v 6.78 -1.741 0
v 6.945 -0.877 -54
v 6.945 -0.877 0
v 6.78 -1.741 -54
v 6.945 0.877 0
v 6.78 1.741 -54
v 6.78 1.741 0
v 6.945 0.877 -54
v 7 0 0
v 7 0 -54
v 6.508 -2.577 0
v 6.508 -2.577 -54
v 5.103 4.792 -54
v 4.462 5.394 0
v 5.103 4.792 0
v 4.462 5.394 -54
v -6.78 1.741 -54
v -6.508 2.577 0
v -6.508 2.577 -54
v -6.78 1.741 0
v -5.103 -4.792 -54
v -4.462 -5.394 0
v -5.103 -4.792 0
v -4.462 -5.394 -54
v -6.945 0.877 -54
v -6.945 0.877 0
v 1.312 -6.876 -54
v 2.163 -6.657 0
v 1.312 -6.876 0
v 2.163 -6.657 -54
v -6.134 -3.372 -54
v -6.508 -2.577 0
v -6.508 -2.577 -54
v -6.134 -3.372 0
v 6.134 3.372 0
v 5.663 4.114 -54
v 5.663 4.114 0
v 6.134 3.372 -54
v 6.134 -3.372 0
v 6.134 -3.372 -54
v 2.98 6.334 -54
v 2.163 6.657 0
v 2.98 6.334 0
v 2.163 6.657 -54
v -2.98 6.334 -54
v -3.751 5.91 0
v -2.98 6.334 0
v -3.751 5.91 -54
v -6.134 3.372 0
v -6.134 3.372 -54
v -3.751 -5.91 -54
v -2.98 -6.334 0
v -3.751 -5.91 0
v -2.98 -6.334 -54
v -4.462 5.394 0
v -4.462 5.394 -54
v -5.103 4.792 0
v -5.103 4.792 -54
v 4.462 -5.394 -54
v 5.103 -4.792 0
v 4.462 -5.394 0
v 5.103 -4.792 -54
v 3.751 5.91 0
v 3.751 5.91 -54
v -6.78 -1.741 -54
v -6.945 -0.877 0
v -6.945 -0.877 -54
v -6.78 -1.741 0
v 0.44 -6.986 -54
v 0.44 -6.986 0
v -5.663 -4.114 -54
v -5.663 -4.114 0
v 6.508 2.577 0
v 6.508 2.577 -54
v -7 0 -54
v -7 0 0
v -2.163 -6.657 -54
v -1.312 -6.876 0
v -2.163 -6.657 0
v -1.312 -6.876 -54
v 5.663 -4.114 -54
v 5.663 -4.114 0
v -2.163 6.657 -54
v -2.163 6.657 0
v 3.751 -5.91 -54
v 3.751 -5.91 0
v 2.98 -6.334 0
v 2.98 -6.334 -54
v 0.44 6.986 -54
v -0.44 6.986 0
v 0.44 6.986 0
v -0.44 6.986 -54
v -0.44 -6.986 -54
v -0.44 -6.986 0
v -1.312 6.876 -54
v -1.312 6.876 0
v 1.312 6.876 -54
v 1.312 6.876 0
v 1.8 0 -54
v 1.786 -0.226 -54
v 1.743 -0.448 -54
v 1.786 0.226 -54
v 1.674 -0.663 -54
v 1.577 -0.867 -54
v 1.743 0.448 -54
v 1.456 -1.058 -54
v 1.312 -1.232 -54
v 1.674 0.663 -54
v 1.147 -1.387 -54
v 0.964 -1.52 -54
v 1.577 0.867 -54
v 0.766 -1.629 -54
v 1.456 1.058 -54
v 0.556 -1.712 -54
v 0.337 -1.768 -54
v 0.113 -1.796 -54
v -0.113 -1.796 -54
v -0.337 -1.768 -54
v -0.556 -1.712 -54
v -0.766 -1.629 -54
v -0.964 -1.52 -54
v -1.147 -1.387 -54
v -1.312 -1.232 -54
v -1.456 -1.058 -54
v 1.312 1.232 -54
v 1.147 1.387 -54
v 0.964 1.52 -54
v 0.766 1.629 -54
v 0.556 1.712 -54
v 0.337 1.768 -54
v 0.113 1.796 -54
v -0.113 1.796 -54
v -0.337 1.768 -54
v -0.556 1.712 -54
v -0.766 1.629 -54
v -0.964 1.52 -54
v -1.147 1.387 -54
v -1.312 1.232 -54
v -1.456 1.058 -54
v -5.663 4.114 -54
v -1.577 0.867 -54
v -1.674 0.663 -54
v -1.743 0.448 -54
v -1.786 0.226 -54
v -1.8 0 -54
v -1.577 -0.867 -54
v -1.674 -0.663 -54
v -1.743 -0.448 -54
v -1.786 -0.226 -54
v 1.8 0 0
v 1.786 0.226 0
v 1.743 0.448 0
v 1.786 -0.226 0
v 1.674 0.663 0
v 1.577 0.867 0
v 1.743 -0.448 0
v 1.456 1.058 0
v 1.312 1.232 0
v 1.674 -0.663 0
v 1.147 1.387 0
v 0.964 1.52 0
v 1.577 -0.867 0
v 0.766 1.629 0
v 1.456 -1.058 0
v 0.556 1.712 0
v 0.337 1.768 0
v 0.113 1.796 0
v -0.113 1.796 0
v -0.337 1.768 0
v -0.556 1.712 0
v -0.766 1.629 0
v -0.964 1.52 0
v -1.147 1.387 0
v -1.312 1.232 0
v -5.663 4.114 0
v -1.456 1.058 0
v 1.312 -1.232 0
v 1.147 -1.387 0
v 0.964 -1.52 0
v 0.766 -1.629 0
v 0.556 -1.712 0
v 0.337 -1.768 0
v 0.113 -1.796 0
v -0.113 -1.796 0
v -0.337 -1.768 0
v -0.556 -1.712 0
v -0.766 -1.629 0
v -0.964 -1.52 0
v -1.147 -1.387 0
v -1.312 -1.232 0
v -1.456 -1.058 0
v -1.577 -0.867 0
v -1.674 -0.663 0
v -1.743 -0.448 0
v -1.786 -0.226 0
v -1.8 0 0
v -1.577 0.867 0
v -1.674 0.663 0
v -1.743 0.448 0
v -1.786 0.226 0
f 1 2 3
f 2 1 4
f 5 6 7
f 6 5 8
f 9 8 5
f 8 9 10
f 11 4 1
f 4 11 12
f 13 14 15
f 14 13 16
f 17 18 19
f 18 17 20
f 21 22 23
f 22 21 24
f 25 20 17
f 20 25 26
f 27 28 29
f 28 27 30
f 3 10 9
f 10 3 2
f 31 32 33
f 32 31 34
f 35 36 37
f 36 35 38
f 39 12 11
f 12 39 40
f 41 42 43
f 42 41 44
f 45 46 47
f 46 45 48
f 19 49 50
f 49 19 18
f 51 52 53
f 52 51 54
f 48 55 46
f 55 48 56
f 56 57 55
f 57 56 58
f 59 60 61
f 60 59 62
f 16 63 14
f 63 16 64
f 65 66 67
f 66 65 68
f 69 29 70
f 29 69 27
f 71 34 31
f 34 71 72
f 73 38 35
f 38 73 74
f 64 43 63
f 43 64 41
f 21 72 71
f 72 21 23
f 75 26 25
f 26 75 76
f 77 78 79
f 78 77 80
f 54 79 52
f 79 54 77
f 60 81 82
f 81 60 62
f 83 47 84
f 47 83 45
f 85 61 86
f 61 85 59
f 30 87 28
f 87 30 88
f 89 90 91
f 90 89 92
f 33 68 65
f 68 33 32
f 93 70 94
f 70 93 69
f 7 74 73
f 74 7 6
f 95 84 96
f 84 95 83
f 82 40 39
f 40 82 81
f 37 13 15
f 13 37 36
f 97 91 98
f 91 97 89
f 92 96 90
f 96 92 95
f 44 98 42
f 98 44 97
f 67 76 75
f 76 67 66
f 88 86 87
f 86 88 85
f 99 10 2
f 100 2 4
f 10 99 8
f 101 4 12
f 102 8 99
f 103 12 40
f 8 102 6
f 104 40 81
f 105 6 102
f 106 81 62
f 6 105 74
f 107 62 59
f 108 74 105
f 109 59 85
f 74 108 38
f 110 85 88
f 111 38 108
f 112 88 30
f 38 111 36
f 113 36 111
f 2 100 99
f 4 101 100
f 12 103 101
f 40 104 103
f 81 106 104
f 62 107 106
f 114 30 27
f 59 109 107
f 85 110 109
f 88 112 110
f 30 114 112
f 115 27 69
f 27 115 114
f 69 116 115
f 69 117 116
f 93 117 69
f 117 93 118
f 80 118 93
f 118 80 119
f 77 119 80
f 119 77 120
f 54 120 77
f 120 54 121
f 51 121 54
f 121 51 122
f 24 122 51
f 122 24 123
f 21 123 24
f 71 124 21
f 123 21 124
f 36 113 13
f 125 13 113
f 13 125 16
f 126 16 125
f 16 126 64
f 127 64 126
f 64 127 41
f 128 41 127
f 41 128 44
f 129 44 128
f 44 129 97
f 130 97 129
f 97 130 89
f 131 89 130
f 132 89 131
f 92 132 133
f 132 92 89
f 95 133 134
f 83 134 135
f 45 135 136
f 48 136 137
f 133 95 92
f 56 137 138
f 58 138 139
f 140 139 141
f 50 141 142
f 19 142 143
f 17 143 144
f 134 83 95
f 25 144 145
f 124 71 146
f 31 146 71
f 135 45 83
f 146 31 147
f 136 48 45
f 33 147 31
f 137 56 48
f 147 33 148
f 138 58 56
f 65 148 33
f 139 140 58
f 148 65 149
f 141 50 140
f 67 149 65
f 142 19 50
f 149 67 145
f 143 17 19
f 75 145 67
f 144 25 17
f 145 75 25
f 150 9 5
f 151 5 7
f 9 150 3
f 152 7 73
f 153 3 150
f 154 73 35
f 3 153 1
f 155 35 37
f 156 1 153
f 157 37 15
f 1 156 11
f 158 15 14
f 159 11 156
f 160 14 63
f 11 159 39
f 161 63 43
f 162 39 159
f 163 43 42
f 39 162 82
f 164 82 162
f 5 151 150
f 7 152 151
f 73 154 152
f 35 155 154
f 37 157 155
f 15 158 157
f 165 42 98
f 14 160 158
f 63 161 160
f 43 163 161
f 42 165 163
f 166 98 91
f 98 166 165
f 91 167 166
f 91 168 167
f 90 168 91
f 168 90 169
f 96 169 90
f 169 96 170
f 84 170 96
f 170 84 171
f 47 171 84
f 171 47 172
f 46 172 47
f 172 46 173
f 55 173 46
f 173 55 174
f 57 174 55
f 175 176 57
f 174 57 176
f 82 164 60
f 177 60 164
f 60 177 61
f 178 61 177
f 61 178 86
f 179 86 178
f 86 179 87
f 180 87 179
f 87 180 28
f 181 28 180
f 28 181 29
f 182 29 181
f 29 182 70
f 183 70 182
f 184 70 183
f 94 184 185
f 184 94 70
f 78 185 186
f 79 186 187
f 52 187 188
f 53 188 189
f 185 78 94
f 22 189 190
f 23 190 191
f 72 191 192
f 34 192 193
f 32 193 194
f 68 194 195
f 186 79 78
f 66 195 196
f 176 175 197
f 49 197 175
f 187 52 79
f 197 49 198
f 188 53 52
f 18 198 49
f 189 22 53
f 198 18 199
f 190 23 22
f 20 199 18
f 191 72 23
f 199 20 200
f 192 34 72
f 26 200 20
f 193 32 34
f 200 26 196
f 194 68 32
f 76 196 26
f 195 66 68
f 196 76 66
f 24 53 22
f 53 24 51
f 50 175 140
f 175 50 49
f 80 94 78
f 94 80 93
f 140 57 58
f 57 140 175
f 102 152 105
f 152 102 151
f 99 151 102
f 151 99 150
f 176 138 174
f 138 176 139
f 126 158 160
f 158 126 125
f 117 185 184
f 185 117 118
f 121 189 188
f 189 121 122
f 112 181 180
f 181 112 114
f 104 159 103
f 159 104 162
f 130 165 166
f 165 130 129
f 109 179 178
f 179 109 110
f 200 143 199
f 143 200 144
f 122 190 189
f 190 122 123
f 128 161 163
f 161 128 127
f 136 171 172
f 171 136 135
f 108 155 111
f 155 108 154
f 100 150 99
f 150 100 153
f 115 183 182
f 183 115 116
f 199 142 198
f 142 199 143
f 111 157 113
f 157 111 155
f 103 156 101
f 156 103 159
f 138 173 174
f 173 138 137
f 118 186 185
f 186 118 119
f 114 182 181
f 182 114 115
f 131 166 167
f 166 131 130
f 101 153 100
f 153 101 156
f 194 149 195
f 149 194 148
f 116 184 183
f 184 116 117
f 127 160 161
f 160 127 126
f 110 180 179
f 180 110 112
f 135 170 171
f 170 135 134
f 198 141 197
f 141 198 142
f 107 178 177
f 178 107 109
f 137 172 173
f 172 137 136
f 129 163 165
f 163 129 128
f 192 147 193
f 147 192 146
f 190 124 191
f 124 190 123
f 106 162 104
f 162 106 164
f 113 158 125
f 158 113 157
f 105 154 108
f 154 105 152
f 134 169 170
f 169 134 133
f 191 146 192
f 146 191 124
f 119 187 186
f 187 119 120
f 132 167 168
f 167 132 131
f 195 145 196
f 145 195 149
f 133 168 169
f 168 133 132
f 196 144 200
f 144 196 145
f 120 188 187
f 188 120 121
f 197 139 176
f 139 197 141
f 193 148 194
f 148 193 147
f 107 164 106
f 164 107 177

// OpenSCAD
$fn = 50;


difference() {
	union() {
		translate(v = [0, 0, -54.0000000000]) {
			cylinder(h = 54, r = 7.0000000000);
		}
		cylinder(h = 0, r = 17.0000000000);
	}
	union() {
		#translate(v = [0, 0, -54]) {
			cylinder(h = 54, r = 1.8000000000);
		}
	}
}
